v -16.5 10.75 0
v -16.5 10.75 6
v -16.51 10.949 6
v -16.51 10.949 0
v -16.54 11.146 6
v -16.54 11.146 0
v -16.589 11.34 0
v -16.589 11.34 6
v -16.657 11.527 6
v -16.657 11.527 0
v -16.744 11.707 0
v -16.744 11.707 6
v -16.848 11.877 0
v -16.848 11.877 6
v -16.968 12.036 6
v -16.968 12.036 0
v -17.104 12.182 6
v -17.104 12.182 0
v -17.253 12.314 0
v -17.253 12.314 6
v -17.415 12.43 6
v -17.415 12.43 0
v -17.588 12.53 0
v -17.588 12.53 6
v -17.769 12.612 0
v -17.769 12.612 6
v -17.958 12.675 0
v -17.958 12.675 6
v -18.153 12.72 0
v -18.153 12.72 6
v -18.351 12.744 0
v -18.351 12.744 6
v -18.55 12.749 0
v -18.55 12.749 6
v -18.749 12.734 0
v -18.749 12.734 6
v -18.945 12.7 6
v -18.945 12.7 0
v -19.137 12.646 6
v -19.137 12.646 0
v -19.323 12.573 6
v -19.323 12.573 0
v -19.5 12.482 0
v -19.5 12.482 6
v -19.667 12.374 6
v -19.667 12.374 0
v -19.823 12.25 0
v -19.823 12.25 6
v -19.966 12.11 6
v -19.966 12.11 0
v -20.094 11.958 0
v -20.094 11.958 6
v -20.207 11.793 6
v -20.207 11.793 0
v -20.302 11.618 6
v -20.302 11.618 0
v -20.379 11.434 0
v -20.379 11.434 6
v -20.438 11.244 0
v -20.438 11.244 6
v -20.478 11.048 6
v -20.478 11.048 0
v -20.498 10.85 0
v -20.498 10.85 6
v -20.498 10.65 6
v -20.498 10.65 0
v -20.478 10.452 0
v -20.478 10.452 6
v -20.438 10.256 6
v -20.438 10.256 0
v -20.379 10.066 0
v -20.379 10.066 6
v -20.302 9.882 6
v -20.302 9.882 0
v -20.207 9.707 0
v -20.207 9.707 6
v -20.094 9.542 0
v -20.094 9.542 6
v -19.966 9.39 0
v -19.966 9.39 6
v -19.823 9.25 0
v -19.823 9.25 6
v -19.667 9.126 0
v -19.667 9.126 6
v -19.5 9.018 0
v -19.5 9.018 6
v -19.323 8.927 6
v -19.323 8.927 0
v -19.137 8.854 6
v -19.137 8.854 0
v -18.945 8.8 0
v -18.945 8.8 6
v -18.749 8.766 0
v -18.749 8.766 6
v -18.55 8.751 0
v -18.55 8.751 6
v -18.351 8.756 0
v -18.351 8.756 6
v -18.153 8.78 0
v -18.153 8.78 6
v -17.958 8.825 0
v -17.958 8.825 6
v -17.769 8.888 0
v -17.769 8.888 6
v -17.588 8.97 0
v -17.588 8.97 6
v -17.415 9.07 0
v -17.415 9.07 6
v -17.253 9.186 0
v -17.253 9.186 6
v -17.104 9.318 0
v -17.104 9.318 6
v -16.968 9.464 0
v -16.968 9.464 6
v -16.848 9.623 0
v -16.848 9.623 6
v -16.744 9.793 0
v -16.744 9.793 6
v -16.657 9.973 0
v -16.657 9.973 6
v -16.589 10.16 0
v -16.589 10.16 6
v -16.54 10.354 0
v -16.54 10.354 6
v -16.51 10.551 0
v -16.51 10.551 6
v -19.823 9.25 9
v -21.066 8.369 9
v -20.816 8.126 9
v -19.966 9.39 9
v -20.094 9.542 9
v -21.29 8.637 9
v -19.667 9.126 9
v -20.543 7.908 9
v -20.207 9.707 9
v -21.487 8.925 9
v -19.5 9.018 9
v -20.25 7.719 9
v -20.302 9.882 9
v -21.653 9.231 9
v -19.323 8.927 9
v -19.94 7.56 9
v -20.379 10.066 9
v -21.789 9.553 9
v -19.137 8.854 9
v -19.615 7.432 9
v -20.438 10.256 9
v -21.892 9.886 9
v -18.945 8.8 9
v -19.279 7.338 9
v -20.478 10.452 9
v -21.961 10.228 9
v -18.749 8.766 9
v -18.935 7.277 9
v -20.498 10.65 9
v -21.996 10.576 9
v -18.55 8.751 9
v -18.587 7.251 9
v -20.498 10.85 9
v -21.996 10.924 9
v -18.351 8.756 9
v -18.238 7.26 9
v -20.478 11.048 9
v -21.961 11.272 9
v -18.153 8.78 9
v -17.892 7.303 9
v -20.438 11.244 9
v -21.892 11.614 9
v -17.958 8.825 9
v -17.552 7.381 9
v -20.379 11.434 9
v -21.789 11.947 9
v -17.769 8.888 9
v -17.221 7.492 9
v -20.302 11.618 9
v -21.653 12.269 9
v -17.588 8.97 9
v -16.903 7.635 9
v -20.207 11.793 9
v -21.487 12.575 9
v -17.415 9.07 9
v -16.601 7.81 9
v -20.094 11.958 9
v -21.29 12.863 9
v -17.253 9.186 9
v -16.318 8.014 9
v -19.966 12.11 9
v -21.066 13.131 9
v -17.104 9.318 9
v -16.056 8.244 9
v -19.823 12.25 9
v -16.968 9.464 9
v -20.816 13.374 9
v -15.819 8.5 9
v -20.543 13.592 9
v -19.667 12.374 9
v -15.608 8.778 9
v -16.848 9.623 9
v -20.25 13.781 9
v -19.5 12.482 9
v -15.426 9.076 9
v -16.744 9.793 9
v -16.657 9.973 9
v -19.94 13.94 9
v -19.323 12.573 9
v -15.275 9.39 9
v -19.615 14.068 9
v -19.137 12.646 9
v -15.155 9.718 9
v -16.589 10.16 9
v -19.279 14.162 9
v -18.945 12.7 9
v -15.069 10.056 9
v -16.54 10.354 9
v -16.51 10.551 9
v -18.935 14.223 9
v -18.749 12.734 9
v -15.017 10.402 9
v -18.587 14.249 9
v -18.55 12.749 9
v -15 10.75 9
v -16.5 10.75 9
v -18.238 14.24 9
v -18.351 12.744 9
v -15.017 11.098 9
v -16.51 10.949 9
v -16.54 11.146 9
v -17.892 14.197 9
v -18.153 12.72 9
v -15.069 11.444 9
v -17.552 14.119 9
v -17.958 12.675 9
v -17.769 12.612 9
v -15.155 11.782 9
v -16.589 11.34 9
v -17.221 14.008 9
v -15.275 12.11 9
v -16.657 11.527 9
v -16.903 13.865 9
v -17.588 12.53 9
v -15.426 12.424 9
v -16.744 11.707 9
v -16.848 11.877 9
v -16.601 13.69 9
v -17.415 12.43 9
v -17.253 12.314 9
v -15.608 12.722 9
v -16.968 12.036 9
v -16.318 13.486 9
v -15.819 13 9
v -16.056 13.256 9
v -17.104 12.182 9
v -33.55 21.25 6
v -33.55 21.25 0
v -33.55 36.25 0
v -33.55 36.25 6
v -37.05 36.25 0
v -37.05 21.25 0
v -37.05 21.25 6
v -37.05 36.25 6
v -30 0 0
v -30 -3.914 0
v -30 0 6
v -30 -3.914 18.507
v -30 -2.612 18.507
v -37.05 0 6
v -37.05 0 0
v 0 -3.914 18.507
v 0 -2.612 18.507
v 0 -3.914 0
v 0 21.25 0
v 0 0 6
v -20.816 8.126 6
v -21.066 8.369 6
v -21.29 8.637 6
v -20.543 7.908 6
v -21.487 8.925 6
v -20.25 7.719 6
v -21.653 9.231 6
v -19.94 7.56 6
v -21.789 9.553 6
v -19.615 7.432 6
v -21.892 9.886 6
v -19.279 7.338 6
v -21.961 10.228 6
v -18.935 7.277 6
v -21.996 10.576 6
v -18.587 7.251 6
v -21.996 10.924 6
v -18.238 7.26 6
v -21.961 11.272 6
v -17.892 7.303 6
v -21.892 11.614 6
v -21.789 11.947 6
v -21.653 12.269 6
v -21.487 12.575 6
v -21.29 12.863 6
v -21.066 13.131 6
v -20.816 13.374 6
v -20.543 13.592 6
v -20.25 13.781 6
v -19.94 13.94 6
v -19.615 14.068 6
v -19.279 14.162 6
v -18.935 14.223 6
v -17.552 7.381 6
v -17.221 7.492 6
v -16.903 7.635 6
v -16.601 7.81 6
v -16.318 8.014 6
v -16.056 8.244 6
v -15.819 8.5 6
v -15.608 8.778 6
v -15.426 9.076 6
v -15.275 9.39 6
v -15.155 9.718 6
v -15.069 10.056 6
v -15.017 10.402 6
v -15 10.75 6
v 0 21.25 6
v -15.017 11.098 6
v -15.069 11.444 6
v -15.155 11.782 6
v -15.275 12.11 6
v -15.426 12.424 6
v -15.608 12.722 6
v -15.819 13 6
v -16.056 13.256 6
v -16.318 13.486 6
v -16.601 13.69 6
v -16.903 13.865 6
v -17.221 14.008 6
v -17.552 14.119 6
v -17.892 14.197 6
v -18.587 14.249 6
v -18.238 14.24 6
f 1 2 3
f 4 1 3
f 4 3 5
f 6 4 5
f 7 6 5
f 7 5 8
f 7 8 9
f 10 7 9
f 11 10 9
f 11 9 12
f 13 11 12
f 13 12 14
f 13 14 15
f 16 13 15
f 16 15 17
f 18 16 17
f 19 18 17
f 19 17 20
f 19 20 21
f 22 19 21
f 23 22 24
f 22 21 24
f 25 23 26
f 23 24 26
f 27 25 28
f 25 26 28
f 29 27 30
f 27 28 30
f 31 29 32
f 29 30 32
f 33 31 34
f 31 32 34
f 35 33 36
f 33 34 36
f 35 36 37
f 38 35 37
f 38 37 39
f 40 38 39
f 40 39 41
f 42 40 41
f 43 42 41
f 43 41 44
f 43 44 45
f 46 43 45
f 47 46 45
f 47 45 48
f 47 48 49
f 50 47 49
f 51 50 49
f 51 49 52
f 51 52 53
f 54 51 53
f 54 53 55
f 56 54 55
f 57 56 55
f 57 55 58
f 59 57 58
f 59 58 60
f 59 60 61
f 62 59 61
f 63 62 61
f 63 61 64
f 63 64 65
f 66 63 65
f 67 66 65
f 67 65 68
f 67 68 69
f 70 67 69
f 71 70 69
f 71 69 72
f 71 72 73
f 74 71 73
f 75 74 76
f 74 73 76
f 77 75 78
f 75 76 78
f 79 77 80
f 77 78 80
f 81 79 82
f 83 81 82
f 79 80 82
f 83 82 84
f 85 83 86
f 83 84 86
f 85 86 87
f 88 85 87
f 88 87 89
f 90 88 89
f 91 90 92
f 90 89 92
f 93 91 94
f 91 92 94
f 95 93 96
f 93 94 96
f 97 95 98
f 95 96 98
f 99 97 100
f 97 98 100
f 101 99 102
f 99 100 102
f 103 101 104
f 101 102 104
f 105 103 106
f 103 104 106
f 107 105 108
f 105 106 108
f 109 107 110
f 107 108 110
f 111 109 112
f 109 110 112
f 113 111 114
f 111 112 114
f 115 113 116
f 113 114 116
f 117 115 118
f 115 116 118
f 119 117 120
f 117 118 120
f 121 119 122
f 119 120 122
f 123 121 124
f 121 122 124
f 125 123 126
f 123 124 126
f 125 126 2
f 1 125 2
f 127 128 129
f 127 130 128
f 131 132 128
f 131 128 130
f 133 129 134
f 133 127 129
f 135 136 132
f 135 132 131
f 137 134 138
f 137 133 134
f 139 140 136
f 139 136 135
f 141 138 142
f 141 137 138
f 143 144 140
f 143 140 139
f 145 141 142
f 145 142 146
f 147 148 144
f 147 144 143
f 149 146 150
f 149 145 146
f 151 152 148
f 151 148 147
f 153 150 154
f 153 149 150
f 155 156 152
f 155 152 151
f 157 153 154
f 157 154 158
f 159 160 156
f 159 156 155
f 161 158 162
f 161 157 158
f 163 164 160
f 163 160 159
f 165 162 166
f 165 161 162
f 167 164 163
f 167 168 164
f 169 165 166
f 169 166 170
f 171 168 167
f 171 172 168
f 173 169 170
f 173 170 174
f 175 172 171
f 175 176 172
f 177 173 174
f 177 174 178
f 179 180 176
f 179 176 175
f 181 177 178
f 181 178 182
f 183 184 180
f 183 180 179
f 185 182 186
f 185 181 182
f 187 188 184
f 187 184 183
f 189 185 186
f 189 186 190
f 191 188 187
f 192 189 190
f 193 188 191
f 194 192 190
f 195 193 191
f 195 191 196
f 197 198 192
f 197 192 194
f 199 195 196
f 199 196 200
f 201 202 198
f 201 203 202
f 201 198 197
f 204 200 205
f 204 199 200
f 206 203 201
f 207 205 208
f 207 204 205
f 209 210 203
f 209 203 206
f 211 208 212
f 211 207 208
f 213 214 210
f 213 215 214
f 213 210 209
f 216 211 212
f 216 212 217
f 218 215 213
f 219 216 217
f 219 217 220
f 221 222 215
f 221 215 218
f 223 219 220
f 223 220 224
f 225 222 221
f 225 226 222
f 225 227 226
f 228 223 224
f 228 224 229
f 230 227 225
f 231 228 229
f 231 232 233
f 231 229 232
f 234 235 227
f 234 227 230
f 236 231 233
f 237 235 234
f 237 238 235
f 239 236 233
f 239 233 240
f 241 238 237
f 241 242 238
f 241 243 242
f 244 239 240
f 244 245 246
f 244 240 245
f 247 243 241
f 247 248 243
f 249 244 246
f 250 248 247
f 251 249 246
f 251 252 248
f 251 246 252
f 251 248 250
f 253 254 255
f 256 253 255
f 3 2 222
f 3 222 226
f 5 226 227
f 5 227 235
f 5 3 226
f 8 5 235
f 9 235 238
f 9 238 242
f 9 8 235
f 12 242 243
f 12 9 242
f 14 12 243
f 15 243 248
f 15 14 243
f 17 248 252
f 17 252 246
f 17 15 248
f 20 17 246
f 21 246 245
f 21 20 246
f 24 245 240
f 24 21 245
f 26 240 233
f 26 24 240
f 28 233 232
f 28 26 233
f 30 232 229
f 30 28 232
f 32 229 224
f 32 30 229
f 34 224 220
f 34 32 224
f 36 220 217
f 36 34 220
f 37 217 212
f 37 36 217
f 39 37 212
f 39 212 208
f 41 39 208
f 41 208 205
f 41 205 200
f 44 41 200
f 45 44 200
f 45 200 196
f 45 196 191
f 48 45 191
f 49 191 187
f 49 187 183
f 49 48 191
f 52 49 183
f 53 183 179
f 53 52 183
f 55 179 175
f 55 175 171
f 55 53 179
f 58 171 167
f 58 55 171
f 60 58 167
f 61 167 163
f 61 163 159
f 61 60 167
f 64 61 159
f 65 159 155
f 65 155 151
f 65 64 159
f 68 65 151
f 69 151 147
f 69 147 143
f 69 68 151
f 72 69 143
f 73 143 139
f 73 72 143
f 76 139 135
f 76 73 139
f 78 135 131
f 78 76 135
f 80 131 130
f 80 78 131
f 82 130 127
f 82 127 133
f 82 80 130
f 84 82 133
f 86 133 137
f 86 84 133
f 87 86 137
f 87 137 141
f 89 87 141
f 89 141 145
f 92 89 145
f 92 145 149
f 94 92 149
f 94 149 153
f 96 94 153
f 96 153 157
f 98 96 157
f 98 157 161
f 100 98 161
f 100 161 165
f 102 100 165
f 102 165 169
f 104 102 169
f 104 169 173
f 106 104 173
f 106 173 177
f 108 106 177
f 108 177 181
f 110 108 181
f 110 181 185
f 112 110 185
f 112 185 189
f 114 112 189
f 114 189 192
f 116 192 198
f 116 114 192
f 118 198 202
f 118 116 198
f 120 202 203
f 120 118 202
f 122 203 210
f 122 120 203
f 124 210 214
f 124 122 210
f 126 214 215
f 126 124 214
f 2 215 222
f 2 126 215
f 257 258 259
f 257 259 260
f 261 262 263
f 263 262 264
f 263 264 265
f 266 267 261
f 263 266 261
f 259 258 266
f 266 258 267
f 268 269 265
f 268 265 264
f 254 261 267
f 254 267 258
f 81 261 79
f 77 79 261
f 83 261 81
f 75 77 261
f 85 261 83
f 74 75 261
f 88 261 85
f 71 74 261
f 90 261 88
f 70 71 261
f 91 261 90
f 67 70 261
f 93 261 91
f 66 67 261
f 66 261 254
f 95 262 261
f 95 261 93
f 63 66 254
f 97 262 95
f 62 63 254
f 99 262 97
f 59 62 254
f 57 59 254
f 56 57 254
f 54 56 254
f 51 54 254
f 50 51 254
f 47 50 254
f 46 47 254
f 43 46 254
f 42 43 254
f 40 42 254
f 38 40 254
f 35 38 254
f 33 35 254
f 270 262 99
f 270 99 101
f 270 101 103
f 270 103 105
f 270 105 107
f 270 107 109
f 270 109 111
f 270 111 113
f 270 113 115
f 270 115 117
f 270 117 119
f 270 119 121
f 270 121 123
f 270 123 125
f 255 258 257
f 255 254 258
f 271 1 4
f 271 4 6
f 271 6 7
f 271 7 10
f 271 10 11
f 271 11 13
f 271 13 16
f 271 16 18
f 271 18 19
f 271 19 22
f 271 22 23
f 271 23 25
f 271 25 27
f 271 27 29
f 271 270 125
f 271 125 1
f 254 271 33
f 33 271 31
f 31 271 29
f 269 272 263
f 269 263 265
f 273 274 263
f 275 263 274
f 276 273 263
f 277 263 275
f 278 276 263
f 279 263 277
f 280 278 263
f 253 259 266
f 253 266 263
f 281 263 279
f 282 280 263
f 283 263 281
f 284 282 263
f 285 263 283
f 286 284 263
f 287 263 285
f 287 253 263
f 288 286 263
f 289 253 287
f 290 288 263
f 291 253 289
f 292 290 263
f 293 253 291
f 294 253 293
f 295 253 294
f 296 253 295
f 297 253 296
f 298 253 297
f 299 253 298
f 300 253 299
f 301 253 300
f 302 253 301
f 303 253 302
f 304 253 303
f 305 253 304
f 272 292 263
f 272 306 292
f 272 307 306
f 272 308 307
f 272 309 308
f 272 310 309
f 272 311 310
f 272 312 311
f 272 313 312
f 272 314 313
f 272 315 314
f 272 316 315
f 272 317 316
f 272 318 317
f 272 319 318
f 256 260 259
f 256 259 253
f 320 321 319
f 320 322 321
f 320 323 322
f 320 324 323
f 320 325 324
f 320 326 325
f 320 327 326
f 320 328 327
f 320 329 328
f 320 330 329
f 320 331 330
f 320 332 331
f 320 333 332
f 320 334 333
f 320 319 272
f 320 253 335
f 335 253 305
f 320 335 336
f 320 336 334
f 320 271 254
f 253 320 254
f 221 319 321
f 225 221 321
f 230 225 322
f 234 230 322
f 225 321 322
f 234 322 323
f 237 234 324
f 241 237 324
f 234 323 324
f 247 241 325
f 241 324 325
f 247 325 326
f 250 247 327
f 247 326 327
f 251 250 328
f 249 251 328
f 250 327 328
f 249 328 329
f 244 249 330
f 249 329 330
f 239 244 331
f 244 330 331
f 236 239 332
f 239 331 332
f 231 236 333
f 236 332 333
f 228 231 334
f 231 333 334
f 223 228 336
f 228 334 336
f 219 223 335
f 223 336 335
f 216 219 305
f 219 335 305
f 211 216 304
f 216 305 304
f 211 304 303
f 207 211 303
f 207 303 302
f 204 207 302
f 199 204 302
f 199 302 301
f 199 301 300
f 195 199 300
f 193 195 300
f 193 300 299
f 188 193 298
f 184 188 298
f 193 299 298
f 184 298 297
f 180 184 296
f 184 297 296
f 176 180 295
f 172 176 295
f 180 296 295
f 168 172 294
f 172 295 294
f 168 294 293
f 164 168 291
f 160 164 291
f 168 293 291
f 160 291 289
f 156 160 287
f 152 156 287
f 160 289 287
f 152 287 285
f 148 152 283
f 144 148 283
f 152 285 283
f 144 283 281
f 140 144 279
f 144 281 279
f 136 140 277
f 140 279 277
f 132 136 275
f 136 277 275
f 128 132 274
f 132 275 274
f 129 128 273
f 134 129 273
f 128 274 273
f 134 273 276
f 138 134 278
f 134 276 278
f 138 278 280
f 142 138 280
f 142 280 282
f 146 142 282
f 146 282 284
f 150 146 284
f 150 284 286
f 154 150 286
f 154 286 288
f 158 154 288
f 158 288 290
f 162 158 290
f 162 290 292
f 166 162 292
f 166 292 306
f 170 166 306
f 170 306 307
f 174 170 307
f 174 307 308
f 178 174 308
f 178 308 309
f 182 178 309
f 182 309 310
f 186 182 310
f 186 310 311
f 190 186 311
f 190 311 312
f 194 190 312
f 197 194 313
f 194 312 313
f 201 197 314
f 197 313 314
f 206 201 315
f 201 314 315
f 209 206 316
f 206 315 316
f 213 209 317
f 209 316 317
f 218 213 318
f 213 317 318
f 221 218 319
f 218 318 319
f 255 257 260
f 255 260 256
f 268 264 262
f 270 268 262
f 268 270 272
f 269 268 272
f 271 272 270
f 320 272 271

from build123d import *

# Parameters (mm, degrees)
F0_W      = 3.500263
F0_H      = 15
F1_DEPTH  = 6
F2_R      = 3.5
F2_R_2    = 2
F3_DEPTH  = 3
F3_FACE_R = 2
F4_DEPTH  = 25
F6_DEPTH  = 30


with BuildPart() as f1:
    # F0 (on Top) → F1 (new body)
    with BuildSketch(Plane.XY):
        with Locations((-35.299869, 28.75)):
            Rectangle(F0_W, F0_H)
        Polygon((-37.05, 0), (0, 0), (0, 21.25), (-33.549737, 21.25), (-37.05, 21.25), align=None)
    extrude(amount=F1_DEPTH)

    # F2 (on face) → F3 (join)
    with BuildSketch(Plane.XY.offset(6)):
        with Locations((-18.5, 10.75)):
            Circle(F2_R)
        with Locations((-18.5, 10.75)):
            Circle(F2_R_2, mode=Mode.SUBTRACT)
    extrude(amount=F3_DEPTH)

    # F3_face (on face) → F4 (cut)
    with BuildSketch(Plane(origin=(-18.5, 10.75, 6), x_dir=(1, 0, 0), z_dir=(0, 0, 1))):
        Circle(F3_FACE_R)
    extrude(amount=-F4_DEPTH, mode=Mode.SUBTRACT)

    # F5 (on face) → F6 (join)
    with BuildSketch(Plane.YZ):
        Polygon((-3.914129, 0), (0, 0), (0, 6), (-2.612495, 18.507209), (-3.914129, 18.507209), align=None)
    extrude(amount=-F6_DEPTH)


solid = f1.part
